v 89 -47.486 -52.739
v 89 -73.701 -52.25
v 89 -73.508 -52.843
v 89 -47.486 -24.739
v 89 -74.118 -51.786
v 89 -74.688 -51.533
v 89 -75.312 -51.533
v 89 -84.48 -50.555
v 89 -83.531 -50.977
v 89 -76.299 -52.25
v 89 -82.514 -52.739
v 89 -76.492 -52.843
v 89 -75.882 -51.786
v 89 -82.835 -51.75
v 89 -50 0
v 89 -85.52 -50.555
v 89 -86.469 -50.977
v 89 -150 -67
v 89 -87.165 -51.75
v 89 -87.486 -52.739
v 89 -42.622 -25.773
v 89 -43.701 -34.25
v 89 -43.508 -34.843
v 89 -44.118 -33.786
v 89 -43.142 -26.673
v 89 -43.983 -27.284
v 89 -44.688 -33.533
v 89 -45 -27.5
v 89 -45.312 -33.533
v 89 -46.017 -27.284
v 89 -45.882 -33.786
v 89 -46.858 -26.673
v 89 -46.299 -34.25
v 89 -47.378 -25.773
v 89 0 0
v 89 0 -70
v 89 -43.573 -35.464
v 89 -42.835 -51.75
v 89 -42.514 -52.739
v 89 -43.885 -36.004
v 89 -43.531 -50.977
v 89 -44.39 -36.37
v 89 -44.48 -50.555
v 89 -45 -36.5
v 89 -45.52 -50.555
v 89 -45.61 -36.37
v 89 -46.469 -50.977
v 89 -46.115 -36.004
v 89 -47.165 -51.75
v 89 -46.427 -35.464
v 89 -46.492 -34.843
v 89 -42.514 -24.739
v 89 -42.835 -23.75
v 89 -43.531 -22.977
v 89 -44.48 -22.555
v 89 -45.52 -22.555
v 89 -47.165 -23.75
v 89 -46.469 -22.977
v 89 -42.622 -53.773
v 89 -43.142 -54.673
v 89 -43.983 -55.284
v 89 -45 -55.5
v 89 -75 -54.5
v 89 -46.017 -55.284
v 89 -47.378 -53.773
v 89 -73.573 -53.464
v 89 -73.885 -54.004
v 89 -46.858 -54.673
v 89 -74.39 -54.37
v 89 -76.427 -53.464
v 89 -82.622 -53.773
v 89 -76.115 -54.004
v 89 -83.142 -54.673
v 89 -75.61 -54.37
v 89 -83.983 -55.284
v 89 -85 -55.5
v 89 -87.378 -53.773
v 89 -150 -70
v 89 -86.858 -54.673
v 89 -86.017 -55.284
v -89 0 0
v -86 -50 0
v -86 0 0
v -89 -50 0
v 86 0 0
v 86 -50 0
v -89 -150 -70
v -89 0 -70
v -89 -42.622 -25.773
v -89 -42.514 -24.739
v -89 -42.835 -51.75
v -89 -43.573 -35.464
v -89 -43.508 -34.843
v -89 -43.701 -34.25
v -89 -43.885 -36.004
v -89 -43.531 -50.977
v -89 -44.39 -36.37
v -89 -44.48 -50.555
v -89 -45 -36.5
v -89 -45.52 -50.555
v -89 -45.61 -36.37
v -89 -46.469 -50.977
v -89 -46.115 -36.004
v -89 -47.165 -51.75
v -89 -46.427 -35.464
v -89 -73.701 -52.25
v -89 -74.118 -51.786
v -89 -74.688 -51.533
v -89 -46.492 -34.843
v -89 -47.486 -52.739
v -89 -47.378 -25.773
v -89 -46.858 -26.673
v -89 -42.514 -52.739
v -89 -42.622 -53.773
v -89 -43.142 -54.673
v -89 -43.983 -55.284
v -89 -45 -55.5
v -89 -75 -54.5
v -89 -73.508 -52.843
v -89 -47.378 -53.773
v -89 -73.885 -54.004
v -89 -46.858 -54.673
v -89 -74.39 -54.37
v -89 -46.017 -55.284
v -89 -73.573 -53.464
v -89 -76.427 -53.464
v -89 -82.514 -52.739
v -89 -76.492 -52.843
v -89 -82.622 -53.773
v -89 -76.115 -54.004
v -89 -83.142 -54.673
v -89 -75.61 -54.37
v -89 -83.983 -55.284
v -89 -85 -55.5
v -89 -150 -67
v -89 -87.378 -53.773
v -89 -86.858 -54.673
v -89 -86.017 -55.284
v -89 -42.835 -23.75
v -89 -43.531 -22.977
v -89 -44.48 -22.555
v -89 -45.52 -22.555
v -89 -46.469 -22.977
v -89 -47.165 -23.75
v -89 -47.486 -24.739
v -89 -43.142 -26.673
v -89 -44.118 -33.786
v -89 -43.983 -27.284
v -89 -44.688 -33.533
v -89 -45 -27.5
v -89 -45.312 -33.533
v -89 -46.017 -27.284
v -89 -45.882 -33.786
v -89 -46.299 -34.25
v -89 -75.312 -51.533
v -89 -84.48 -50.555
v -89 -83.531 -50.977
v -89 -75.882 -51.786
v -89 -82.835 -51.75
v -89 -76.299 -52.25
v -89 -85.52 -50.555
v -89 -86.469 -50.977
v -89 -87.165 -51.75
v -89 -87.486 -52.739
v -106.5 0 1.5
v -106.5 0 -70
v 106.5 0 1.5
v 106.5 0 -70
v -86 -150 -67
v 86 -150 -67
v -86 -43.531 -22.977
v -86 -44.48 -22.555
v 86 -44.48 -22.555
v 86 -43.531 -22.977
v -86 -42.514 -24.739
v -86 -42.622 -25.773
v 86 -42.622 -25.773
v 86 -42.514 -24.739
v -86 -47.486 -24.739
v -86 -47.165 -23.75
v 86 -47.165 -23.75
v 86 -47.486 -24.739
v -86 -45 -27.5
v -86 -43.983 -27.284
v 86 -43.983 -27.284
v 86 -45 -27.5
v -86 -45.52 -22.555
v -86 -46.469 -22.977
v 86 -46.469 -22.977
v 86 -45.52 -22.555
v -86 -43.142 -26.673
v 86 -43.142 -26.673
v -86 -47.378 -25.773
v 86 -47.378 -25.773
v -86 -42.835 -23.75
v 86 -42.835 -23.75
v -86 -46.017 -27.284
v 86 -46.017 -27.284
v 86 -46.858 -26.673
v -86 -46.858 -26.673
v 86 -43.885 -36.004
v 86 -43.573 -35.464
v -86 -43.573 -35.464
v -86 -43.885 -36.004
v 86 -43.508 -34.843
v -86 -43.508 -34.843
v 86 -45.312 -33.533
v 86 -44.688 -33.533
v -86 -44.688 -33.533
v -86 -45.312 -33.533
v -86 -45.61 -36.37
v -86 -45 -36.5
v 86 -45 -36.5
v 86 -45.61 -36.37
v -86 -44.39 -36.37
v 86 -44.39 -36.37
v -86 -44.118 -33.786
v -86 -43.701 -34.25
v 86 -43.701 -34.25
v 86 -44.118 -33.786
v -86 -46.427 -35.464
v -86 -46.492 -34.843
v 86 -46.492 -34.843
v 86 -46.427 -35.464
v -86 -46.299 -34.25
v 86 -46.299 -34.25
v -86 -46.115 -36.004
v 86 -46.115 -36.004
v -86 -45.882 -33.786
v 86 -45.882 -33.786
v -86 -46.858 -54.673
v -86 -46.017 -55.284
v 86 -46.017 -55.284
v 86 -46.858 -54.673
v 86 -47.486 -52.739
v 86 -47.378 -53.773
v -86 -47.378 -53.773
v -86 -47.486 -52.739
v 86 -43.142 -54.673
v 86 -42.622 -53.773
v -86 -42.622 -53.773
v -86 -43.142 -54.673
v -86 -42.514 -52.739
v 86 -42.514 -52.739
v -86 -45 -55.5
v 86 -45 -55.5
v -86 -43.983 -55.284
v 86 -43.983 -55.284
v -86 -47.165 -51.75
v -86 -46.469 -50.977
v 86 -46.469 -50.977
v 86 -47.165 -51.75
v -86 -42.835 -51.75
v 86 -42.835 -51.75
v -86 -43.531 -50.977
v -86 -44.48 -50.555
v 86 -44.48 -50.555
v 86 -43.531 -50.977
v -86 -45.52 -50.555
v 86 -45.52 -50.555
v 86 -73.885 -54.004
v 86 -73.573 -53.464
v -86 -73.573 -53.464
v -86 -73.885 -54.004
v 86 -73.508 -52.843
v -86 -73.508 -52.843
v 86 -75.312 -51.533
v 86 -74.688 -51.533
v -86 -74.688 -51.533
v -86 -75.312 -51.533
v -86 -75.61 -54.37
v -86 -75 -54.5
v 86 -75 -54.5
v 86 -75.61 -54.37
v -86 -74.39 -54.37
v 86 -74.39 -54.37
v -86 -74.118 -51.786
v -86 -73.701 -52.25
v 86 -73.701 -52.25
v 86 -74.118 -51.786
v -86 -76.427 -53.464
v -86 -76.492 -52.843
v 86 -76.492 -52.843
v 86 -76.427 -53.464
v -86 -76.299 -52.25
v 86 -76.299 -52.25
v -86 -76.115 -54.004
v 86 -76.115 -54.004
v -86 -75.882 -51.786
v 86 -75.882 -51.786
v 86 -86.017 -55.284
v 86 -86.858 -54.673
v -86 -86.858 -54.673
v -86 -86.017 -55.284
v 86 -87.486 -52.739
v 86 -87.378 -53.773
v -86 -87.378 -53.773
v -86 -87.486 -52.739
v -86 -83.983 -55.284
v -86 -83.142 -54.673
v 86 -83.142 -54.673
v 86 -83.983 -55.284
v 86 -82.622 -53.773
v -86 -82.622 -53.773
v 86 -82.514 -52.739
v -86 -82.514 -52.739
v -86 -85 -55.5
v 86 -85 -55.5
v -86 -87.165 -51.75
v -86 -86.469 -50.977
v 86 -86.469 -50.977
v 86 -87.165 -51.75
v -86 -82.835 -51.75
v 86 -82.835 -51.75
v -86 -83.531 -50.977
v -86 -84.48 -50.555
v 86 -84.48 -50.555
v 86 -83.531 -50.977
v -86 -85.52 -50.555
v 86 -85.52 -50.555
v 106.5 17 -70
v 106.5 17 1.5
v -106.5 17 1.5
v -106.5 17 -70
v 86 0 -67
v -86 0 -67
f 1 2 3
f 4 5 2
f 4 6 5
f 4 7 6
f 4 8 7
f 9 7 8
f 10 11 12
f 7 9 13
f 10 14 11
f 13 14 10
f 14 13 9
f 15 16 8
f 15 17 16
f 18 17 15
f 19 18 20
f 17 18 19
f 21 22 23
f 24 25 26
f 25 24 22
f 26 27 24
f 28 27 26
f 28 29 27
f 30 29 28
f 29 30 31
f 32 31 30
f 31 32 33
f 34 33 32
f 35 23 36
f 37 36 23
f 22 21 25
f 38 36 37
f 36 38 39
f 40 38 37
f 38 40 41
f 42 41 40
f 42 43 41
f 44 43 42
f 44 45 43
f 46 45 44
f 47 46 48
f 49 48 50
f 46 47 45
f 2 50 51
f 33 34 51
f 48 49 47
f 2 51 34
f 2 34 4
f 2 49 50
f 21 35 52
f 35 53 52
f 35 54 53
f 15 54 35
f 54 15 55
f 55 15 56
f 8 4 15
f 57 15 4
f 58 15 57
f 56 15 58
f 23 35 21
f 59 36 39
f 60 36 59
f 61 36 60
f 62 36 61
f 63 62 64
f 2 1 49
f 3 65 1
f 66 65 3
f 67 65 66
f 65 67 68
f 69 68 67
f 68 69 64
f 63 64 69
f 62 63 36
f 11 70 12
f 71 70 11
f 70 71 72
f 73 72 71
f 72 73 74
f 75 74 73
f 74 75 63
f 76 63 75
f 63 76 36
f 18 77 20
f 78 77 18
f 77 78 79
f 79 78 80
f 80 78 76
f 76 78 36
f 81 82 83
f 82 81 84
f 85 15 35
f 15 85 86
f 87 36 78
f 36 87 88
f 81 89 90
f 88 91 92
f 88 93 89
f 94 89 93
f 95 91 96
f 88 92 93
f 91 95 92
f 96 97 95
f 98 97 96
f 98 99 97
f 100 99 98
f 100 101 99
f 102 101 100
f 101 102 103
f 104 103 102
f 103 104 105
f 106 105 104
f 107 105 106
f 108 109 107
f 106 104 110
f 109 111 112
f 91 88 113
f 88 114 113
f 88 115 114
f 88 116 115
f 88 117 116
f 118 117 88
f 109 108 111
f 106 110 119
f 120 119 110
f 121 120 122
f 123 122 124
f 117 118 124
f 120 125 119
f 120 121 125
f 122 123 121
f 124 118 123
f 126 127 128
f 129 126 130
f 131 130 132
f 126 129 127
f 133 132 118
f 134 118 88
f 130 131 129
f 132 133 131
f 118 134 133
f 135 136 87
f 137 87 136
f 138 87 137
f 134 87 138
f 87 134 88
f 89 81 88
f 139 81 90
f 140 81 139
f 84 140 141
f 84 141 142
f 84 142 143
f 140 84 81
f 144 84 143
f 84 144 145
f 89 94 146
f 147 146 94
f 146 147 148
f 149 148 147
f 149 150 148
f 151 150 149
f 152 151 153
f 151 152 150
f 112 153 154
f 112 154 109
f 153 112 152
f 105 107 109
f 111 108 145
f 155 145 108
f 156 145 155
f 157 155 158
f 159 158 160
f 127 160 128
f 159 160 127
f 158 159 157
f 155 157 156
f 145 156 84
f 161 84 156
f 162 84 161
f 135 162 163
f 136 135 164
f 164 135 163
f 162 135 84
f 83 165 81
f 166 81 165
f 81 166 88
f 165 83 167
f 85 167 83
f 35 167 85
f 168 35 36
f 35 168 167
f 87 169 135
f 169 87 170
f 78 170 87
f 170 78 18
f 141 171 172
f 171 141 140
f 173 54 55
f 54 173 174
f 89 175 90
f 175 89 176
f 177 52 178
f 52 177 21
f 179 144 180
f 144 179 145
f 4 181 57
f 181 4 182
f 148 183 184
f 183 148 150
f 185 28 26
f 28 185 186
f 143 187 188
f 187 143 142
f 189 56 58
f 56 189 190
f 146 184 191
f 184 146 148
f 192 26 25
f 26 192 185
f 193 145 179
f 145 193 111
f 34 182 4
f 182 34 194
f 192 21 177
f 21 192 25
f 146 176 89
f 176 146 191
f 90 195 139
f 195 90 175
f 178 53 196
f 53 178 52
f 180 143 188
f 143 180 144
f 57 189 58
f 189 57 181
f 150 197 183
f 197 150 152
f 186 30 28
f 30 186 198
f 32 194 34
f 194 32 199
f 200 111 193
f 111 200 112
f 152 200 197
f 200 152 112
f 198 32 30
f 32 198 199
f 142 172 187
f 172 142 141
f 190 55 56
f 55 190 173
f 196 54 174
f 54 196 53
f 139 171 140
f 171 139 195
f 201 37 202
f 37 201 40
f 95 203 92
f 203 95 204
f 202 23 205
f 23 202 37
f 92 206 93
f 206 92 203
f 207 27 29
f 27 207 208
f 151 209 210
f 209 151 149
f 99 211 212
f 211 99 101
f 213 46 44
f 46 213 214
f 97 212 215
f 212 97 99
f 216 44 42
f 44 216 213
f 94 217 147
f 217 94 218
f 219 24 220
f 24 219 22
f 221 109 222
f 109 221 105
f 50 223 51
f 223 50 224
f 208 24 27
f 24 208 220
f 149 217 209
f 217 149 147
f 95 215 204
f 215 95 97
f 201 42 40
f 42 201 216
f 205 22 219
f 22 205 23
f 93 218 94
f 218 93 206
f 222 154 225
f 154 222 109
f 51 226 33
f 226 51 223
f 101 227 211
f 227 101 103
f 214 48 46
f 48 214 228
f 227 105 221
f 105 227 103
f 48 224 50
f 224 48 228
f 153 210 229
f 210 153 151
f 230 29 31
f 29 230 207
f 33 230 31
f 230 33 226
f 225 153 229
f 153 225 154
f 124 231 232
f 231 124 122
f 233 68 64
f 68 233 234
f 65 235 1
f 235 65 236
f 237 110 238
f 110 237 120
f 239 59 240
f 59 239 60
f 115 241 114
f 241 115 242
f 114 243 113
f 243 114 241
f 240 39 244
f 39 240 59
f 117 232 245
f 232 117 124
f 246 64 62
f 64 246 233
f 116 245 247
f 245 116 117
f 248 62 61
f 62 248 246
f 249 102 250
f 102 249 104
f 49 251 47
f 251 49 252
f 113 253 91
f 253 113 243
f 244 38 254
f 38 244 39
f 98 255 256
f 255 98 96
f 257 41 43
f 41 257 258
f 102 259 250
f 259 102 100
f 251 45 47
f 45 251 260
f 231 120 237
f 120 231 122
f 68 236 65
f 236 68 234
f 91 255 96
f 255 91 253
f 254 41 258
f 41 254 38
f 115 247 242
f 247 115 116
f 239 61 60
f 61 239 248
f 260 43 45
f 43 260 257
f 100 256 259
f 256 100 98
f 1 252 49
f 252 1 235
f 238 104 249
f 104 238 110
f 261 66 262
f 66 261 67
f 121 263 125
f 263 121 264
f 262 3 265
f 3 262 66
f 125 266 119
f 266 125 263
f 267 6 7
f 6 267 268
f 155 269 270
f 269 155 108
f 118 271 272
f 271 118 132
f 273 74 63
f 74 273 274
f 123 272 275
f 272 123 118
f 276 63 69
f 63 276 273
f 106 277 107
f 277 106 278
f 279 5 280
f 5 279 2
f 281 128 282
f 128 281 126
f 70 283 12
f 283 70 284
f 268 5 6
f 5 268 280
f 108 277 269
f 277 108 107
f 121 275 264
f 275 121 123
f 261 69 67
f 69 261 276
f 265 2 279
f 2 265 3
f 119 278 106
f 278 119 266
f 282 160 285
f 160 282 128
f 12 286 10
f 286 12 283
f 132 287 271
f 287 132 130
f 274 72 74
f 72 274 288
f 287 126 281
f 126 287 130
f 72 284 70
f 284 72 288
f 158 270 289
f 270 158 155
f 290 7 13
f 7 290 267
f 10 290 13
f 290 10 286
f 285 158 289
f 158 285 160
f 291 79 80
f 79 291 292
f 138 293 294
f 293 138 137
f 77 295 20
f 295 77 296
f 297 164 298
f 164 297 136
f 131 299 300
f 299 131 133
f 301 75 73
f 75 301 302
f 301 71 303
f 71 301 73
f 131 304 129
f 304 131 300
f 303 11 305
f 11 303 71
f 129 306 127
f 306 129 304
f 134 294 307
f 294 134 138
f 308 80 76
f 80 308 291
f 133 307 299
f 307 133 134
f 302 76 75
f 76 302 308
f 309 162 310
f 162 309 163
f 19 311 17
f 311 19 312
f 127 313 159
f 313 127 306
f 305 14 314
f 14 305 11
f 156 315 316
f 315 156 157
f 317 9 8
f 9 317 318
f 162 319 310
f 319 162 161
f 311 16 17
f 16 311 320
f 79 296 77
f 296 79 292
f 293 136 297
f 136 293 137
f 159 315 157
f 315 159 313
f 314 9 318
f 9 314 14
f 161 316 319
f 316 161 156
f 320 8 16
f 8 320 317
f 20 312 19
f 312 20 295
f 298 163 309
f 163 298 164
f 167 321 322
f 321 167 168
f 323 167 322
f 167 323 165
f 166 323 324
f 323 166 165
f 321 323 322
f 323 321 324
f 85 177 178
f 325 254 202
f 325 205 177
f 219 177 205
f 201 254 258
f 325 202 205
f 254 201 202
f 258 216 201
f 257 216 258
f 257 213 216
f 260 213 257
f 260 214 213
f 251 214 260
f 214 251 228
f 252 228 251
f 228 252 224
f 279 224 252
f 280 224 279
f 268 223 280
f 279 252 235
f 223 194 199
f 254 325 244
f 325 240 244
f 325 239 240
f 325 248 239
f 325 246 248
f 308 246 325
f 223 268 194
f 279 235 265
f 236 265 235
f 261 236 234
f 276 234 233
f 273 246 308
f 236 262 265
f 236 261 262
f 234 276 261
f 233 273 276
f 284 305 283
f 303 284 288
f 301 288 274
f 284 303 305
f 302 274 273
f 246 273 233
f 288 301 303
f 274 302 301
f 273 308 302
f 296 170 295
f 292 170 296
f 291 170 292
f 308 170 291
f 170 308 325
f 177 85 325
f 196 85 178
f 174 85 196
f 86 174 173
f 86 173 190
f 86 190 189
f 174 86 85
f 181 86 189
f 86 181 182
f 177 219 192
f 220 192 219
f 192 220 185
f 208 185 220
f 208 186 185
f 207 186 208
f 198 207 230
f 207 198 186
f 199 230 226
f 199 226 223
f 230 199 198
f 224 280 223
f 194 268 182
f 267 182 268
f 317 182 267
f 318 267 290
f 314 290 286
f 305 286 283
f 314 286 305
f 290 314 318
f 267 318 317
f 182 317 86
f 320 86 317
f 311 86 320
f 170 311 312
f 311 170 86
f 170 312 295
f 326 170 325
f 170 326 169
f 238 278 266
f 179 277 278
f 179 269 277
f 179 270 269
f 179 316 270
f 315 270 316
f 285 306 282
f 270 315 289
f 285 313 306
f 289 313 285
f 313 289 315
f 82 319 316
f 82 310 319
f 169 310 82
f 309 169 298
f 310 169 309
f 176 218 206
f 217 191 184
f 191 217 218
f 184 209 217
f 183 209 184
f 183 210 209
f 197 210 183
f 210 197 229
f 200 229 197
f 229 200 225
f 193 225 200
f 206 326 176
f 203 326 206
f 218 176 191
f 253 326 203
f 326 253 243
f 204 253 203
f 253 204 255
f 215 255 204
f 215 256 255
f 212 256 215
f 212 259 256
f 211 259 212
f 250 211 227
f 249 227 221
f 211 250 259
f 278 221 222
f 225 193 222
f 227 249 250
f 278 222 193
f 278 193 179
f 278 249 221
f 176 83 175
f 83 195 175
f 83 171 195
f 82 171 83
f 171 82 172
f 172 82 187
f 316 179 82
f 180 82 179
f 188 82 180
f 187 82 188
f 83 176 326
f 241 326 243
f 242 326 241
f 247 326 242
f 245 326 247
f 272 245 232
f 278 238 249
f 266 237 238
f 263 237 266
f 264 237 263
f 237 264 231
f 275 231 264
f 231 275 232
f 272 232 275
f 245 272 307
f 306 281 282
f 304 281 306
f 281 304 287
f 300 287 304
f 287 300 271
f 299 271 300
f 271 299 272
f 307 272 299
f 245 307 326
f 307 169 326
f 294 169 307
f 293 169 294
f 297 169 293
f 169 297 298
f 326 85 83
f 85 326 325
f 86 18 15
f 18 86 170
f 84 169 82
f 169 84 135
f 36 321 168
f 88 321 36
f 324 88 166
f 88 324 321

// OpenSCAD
// units in mm


difference() {
    yeap();
    cutaway();
}

// This section is the head unit that I have.

// There are 3 bolts and 2 index holes:
// btop: bolt top
// bcorner: bolt corner
// bback: bolt back
// itop: index hole top
// iback: index hole back
// These are faces of the case and screen:
// ctop: case top
// cfront: case front
// stop: screen top
bback_bcorner = 40;
bcorner_btop = 28;
btop_itop = 10;
bback_iback = 10;

btop_ctop = 25;
btop_cfront = 45;

ctop_stop = 1.5;

// These are viewing it from inside the cab. "depth" is distance into the dashboard.
case_width = 178;
case_height = 70;
case_depth = 150;

screen_width = 213;
screen_depth = 17;
screen_height = 115;

// Diameters.
bolt_d = 5;
index_d = 3;

module yeap() {
    union() {
        difference() {
            // Case
            translate([0, -case_depth/2, -case_height/2])
            cube([case_width, case_depth, case_height], center=true);

            // Bolt, top
            translate([0, -btop_cfront, -btop_ctop])
            rotate([0,90,0])
            cylinder(h=case_width, d=bolt_d, center=true, $fn=15);

            // Index hole, top
            translate([0, -btop_cfront, -(btop_ctop+btop_itop)])
            rotate([0,90,0])
            cylinder(h=case_width, d=index_d, center=true, $fn=15);

            // Bolt, corner
            translate([0, -btop_cfront, -(btop_ctop+bcorner_btop)])
            rotate([0,90,0])
            cylinder(h=case_width, d=bolt_d, center=true, $fn=15);

            // Index hole, back
            translate([0, -(btop_cfront+bback_bcorner-bback_iback), -(btop_ctop+bcorner_btop)])
            rotate([0,90,0])
            cylinder(h=case_width, d=index_d, center=true, $fn=15);

            // Bolt, back
            translate([0, -(btop_cfront+bback_bcorner), -(btop_ctop+bcorner_btop)])
            rotate([0,90,0])
            cylinder(h=case_width, d=bolt_d, center=true, $fn=15);
        }

        // Screen
        translate([0, screen_depth/2, (-screen_height/2) + ctop_stop])
        cube([screen_width, screen_depth, screen_height], center=true);
    }
}

// This section is preparing it for my uses.

case_wall_thickness = 3;

module cutaway() {
    // Main cavity
    translate([0, -case_depth/2, -(case_height-case_wall_thickness)/2])
    cube([case_width-(case_wall_thickness*2), case_depth, case_height-case_wall_thickness], center=true);

    // Slope on back
    back_cut = [[0,0], [0,-(case_height-case_wall_thickness)], [-100,0]];
    translate([case_width/2, -case_depth, 0])
    rotate([90, 0, -90])
    linear_extrude(height=case_width)
    polygon(back_cut);

    // Remove bottom of screen for ease of print
    translate([-screen_width/2, 0, -(screen_height - ctop_stop)])
    cube([screen_width, screen_depth, screen_height - ctop_stop - case_height]);
    
}
